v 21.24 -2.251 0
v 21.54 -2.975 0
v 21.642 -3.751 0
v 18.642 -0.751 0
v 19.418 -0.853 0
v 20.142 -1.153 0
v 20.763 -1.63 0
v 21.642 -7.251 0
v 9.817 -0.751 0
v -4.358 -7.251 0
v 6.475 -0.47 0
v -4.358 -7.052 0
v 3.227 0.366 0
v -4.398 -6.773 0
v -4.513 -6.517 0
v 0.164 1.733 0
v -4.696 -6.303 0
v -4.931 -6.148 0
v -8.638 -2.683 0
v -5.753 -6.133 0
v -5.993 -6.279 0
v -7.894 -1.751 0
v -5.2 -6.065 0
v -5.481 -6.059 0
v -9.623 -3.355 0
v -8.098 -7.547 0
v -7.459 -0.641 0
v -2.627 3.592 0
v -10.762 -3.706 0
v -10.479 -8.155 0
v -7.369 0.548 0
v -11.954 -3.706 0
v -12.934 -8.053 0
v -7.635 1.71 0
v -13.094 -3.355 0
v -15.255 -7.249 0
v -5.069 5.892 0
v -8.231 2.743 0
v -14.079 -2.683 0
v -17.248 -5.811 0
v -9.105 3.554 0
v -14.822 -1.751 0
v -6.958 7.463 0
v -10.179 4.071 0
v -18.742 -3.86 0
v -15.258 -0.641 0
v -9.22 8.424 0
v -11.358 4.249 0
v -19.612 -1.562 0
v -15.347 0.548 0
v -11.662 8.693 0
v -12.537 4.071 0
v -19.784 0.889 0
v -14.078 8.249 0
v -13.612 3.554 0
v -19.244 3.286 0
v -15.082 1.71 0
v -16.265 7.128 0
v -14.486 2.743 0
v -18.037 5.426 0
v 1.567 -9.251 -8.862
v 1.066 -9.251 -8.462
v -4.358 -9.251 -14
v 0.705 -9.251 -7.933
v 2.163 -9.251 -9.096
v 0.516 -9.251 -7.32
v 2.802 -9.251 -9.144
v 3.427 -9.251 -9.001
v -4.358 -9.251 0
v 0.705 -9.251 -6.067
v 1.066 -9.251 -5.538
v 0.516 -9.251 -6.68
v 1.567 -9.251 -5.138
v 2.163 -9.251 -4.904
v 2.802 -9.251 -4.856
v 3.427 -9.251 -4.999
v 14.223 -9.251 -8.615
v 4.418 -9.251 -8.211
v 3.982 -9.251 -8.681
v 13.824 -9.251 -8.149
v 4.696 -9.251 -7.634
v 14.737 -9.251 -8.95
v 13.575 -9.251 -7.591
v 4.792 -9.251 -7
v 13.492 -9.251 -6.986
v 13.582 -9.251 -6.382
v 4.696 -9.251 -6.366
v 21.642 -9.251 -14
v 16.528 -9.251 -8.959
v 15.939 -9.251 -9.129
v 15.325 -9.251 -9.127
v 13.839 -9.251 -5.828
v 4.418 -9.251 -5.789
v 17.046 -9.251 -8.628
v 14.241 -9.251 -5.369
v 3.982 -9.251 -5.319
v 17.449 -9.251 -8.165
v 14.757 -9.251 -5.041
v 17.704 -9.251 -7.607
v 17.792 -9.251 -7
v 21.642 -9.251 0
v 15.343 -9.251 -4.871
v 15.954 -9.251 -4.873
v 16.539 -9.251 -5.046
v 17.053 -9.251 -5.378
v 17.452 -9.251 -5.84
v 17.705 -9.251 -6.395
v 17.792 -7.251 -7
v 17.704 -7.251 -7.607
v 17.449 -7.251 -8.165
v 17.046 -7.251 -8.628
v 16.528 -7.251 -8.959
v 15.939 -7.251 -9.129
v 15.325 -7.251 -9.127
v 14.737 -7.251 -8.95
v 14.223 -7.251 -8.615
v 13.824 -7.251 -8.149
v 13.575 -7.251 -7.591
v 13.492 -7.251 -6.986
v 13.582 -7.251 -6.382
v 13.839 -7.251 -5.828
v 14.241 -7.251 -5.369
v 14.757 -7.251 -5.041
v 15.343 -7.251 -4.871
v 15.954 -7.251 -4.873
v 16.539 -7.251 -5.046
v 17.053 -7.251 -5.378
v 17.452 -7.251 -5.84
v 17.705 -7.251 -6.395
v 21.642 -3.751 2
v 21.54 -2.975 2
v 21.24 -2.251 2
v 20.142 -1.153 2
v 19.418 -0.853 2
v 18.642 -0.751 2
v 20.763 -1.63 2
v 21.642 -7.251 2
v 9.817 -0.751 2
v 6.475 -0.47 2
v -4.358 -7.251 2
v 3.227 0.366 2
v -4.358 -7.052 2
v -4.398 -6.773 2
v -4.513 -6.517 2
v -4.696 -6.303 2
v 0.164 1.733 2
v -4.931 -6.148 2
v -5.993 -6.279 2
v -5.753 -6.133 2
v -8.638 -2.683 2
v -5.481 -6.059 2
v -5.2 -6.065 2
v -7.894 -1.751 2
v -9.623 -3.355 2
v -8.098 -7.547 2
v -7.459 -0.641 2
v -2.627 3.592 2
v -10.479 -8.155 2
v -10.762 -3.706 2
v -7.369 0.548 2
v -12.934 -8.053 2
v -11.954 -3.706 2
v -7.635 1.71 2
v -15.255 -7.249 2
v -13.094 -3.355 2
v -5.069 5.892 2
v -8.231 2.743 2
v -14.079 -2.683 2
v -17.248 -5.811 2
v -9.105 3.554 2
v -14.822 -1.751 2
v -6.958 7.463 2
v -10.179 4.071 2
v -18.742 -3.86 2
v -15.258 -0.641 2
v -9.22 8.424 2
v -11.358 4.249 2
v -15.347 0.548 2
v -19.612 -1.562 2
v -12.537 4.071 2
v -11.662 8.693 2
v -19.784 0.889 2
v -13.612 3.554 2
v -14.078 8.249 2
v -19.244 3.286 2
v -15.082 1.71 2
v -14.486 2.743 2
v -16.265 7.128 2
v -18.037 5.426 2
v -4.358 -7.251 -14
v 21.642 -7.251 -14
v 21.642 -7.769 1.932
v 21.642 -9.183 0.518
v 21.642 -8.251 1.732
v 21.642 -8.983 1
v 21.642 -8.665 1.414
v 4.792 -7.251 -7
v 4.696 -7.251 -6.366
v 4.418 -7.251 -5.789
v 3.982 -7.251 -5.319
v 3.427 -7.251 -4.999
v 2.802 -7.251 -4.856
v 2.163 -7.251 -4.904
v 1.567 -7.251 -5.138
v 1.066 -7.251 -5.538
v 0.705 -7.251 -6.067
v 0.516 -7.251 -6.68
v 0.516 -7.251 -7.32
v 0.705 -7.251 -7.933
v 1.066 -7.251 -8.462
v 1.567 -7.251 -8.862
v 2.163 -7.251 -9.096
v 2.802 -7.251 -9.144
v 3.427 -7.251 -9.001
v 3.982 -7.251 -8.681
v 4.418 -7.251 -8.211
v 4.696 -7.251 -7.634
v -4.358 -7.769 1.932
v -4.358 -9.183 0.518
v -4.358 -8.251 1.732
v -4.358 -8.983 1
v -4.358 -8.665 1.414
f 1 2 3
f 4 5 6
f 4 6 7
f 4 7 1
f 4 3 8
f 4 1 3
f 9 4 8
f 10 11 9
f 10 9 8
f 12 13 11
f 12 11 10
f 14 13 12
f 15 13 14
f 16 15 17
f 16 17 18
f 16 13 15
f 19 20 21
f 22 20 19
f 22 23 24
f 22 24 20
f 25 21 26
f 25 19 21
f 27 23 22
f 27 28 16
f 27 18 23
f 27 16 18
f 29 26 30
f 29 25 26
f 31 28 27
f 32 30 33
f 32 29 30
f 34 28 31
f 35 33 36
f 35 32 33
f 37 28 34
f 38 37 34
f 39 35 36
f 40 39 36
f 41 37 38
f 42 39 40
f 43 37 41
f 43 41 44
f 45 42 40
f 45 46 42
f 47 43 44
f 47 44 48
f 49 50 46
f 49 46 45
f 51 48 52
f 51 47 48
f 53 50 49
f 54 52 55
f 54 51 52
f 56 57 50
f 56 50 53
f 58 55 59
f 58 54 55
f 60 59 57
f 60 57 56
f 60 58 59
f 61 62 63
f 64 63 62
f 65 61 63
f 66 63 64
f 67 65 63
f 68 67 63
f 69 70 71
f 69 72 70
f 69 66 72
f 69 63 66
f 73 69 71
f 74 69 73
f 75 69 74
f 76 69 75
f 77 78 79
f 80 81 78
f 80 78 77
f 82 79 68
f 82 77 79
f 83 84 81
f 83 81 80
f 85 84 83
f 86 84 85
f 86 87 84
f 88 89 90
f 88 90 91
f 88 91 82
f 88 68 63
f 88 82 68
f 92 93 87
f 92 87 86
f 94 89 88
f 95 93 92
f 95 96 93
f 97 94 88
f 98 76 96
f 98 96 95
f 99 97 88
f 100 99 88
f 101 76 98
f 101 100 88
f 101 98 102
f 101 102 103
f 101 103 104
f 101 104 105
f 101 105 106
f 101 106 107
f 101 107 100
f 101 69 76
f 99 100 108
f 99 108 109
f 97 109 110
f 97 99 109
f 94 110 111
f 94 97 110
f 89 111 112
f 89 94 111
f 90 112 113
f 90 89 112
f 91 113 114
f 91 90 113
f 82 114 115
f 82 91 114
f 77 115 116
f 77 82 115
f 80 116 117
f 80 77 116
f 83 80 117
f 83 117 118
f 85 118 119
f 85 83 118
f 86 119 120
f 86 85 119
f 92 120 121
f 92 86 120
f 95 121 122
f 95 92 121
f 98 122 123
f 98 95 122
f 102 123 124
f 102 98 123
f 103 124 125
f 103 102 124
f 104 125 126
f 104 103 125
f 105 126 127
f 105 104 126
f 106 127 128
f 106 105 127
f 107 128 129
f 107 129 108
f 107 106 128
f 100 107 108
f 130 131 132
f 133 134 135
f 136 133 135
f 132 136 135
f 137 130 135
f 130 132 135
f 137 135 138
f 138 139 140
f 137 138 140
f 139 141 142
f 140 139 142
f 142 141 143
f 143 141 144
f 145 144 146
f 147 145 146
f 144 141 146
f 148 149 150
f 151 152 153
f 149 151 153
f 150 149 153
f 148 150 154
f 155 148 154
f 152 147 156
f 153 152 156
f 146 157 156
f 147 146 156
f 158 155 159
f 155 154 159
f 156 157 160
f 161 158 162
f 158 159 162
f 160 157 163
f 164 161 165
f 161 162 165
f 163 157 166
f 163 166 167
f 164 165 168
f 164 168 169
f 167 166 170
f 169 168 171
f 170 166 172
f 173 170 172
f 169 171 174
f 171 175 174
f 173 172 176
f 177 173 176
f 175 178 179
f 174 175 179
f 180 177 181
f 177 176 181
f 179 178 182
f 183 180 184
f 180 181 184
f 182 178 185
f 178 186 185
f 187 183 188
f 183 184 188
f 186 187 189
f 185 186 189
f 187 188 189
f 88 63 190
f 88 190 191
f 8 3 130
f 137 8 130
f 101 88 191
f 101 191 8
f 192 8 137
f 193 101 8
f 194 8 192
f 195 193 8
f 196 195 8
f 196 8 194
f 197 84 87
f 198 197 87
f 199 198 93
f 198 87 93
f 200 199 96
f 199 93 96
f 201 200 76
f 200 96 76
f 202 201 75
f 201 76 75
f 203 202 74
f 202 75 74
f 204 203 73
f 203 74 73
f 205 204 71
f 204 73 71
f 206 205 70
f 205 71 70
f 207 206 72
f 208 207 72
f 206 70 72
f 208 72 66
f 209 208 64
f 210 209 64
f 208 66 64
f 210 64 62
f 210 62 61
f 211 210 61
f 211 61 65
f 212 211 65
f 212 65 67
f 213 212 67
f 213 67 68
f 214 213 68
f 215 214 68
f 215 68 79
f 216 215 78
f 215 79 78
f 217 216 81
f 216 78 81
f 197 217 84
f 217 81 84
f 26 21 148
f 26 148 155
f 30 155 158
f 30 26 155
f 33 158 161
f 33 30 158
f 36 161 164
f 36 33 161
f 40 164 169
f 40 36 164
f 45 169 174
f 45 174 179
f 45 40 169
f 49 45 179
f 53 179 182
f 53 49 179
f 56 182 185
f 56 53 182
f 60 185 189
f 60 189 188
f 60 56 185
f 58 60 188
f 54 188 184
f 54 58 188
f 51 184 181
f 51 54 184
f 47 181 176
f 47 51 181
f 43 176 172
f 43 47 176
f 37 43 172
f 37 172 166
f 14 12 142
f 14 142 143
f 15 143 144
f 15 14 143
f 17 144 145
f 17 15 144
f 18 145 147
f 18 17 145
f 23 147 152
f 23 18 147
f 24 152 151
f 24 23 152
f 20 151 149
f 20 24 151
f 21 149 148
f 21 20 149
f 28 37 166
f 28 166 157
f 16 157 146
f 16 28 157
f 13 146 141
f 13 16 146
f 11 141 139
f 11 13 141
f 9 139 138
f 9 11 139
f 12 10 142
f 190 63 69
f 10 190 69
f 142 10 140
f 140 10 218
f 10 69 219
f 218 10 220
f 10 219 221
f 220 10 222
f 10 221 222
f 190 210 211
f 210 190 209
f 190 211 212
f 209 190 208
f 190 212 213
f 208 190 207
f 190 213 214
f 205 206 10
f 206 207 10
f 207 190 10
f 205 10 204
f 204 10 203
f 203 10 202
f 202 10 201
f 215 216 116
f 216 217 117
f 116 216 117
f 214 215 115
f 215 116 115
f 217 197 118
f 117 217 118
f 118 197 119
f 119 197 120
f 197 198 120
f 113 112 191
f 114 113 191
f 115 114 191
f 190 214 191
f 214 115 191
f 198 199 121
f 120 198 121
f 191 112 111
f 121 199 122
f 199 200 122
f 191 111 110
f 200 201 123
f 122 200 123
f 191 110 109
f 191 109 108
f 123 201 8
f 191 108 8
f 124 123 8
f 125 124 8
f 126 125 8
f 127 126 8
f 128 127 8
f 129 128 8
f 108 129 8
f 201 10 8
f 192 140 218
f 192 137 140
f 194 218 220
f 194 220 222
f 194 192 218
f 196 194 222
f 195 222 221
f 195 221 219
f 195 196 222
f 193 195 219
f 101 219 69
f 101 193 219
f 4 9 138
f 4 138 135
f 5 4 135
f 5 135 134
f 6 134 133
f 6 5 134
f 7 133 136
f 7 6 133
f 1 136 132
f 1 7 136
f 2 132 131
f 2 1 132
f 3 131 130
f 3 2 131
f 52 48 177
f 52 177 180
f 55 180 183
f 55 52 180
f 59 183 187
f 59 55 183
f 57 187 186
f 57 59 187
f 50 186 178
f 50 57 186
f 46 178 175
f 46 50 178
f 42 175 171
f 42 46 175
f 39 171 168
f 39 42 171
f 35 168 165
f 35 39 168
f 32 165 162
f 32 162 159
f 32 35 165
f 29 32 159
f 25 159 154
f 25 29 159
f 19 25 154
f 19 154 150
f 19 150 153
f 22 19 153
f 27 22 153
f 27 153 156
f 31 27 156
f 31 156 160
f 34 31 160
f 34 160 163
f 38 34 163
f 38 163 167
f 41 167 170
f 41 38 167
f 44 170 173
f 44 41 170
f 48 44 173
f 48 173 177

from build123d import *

# Parameters (mm, degrees)
EXTRUDE_1_DEPTH = 2
SKETCH_2_W      = 26
SKETCH_2_H      = 16
SKETCH_2_R      = 2.15
EXTRUDE_2_DEPTH = 2
FILLET_1_R      = 2


with BuildPart() as part:
    # 草图1 → 凸台-拉伸1 (new body)
    with BuildSketch(Plane.XY):
        with BuildLine():
            ThreePointArc((-5.068859013, 5.89218325), (1.666665094, 0.98511468), (9.817268595, -0.751050494))
            Line((9.817268595, -0.751050494), (18.641752073, -0.751050494))
            ThreePointArc((18.641752073, -0.751050494), (20.763072416, -1.62973015), (21.641752073, -3.751050494))
            Line((21.641752073, -3.751050494), (21.641752073, -7.251050494))
            Line((21.641752073, -7.251050494), (-4.358247927, -7.251050494))
            Line((-4.358247927, -7.251050494), (-4.358247927, -7.051906608))
            ThreePointArc((-4.358247927, -7.051906608), (-4.931001298, -6.147771487), (-5.993168562, -6.279329241))
            ThreePointArc((-5.993168562, -6.279329241), (-19.783987468, 0.888803553), (-5.068859013, 5.89218325))
        make_face()
        with BuildLine():
            ThreePointArc((-11.358247927, -3.751050494), (-7.358247927, 0.248949506), (-11.358247927, 4.248949506))
            ThreePointArc((-11.358247927, 4.248949506), (-15.358247927, 0.248949506), (-11.358247927, -3.751050494))
        make_face(mode=Mode.SUBTRACT)
        Polygon((19.641752073, -9.251050494), (-2.358247927, -9.251050494), (-4.358247927, -9.251050494), (-4.358247927, -7.251050494), (21.641752073, -7.251050494), (21.641752073, -9.251050494), align=None)
    extrude(amount=EXTRUDE_1_DEPTH)

    # 草图2 → 凸台-拉伸2 (add)
    with BuildSketch(Plane.XZ.offset(9.251050494)):
        with Locations((8.641752073, -6)):
            Rectangle(SKETCH_2_W, SKETCH_2_H)
        with Locations((2.641752073, -7)):
            Circle(SKETCH_2_R, mode=Mode.SUBTRACT)
        with BuildLine():
            ThreePointArc((13.82437189, -8.148751179), (15.043783592, -4.93482841), (17.791752073, -7))
            ThreePointArc((17.791752073, -7), (16.239720553, -9.06517159), (13.82437189, -8.148751179))
        make_face(mode=Mode.SUBTRACT)
    extrude(amount=-EXTRUDE_2_DEPTH)

    # 圆角1
    fillet_1_edges = [part.edges().sort_by_distance(p)[0] for p in [
        (8.641752073, -9.251050494, 2),
    ]]
    fillet(fillet_1_edges, radius=FILLET_1_R)


solid = part.part
